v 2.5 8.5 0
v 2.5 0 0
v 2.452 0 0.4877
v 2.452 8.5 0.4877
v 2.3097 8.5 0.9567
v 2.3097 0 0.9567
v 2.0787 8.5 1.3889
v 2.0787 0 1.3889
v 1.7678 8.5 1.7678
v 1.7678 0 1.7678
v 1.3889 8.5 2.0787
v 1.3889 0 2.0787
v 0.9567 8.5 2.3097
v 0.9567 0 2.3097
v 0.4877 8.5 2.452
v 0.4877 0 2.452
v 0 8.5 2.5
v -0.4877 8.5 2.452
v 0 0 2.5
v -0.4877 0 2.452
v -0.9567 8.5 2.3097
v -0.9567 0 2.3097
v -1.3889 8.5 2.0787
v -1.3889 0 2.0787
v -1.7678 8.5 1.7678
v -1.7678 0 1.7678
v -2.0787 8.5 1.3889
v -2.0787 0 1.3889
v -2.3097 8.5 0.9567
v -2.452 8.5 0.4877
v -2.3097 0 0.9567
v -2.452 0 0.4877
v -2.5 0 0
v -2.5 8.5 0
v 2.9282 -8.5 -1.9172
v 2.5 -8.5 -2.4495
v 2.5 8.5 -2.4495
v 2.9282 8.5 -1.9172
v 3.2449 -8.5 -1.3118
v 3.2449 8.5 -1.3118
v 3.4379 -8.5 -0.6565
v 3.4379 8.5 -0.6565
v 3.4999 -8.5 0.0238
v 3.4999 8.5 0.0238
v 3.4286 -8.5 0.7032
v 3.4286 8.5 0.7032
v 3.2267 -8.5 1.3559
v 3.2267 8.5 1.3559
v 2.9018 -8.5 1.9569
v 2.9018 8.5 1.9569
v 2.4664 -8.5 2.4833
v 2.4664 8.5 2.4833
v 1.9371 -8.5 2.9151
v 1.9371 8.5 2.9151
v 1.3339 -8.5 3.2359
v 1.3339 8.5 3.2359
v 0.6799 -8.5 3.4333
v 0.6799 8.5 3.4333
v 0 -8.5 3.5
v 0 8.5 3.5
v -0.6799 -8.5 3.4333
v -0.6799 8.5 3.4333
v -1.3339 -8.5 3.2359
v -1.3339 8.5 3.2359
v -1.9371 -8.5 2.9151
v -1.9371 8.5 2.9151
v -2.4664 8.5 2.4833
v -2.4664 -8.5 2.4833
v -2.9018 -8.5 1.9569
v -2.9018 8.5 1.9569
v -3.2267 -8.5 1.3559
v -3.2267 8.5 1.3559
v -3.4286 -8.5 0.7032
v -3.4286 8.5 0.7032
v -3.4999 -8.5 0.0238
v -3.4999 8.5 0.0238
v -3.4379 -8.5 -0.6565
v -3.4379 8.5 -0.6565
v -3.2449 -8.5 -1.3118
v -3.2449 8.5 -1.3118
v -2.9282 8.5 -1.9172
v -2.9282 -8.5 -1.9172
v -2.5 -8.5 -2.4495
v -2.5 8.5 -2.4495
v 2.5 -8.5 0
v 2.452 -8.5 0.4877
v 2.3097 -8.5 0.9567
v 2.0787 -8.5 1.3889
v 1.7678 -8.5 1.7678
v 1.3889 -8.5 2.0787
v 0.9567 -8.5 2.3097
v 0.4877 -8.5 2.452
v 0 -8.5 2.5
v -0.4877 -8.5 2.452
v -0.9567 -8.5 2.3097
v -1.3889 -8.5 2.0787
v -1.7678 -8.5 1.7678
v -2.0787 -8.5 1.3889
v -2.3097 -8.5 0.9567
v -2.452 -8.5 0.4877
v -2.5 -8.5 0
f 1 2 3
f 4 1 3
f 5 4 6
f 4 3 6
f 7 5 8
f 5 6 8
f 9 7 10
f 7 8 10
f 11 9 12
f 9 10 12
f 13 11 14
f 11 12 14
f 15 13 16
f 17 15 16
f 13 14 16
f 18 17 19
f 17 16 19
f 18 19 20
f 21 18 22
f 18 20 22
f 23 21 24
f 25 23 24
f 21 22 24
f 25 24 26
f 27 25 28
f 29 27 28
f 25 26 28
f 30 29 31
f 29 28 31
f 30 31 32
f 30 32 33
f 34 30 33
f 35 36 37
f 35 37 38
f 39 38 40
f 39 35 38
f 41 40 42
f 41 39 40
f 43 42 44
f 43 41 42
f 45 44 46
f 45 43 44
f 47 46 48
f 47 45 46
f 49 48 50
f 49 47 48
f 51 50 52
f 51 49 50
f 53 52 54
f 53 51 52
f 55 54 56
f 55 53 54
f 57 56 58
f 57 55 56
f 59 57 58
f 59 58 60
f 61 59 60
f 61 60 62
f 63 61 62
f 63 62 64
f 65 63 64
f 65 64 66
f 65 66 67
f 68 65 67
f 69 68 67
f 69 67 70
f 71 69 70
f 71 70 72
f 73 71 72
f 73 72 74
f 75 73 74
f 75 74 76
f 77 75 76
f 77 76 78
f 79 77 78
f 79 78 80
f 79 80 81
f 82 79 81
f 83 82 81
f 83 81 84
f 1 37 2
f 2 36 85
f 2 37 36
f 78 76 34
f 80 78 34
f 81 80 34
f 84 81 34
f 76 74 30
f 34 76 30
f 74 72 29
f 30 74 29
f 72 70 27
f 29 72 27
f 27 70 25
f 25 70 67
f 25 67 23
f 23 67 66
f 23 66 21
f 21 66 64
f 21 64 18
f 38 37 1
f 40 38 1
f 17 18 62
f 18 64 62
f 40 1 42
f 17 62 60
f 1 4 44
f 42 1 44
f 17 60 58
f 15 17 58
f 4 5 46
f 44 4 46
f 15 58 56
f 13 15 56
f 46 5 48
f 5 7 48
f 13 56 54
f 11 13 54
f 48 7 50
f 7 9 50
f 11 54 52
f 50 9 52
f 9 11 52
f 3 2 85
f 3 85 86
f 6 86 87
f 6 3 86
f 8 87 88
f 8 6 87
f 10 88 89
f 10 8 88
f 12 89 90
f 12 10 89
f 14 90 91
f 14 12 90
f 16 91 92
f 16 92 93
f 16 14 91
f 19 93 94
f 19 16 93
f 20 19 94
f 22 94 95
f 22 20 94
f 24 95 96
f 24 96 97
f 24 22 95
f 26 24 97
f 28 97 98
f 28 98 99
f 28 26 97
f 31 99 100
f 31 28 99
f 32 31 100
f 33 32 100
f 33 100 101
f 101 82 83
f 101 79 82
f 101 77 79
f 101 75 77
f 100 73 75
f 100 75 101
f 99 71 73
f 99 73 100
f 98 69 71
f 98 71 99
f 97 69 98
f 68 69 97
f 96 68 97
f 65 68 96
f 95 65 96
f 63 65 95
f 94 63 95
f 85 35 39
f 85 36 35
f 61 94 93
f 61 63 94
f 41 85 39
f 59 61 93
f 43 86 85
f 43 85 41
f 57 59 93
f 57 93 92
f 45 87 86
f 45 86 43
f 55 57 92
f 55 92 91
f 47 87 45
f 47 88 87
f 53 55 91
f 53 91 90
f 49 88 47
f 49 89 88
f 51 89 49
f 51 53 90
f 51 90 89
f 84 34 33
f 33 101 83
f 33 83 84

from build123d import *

# Parameters (mm, degrees)
F0_R          = 3.5
F0_R_2        = 2.5
F1_DEPTH      = 8.5
F1_DEPTH_BACK = 8.5
F3_DEPTH      = 17.001


with BuildPart() as f1:
    # F0 (on Front) → F1 (new body, two sides)
    with BuildSketch(Plane.XZ) as f1_sk:
        Circle(F0_R)
        Circle(F0_R_2, mode=Mode.SUBTRACT)
    extrude(amount=F1_DEPTH)
    extrude(f1_sk.sketch, amount=-F1_DEPTH_BACK)

    # F2 (on face) → F3 (cut, through all)
    with BuildSketch(Plane.XZ.offset(8.5)):
        with BuildLine():
            Line((2.5, 0), (-2.5, 0))
            ThreePointArc((-2.5, 0), (0, -2.5), (2.5, 0))
        make_face()
        with BuildLine():
            ThreePointArc((0, -3.5), (-1.355874, -3.226702), (-2.5, -2.44949))
            Line((-2.5, -2.44949), (-2.5, -3.5))
            Line((-2.5, -3.5), (0, -3.5))
        make_face()
        with BuildLine():
            ThreePointArc((2.5, 0), (0, -2.5), (-2.5, 0))
            Line((-2.5, 0), (-2.5, -2.44949))
            ThreePointArc((-2.5, -2.44949), (-1.355874, -3.226702), (0, -3.5))
            ThreePointArc((0, -3.5), (1.355874, -3.226702), (2.5, -2.44949))
            Line((2.5, -2.44949), (2.5, 0))
        make_face()
        with BuildLine():
            Line((2.5, -3.5), (2.5, -2.44949))
            ThreePointArc((2.5, -2.44949), (1.355874, -3.226702), (0, -3.5))
            Line((0, -3.5), (2.5, -3.5))
        make_face()
    extrude(amount=-F3_DEPTH, mode=Mode.SUBTRACT)


solid = f1.part
